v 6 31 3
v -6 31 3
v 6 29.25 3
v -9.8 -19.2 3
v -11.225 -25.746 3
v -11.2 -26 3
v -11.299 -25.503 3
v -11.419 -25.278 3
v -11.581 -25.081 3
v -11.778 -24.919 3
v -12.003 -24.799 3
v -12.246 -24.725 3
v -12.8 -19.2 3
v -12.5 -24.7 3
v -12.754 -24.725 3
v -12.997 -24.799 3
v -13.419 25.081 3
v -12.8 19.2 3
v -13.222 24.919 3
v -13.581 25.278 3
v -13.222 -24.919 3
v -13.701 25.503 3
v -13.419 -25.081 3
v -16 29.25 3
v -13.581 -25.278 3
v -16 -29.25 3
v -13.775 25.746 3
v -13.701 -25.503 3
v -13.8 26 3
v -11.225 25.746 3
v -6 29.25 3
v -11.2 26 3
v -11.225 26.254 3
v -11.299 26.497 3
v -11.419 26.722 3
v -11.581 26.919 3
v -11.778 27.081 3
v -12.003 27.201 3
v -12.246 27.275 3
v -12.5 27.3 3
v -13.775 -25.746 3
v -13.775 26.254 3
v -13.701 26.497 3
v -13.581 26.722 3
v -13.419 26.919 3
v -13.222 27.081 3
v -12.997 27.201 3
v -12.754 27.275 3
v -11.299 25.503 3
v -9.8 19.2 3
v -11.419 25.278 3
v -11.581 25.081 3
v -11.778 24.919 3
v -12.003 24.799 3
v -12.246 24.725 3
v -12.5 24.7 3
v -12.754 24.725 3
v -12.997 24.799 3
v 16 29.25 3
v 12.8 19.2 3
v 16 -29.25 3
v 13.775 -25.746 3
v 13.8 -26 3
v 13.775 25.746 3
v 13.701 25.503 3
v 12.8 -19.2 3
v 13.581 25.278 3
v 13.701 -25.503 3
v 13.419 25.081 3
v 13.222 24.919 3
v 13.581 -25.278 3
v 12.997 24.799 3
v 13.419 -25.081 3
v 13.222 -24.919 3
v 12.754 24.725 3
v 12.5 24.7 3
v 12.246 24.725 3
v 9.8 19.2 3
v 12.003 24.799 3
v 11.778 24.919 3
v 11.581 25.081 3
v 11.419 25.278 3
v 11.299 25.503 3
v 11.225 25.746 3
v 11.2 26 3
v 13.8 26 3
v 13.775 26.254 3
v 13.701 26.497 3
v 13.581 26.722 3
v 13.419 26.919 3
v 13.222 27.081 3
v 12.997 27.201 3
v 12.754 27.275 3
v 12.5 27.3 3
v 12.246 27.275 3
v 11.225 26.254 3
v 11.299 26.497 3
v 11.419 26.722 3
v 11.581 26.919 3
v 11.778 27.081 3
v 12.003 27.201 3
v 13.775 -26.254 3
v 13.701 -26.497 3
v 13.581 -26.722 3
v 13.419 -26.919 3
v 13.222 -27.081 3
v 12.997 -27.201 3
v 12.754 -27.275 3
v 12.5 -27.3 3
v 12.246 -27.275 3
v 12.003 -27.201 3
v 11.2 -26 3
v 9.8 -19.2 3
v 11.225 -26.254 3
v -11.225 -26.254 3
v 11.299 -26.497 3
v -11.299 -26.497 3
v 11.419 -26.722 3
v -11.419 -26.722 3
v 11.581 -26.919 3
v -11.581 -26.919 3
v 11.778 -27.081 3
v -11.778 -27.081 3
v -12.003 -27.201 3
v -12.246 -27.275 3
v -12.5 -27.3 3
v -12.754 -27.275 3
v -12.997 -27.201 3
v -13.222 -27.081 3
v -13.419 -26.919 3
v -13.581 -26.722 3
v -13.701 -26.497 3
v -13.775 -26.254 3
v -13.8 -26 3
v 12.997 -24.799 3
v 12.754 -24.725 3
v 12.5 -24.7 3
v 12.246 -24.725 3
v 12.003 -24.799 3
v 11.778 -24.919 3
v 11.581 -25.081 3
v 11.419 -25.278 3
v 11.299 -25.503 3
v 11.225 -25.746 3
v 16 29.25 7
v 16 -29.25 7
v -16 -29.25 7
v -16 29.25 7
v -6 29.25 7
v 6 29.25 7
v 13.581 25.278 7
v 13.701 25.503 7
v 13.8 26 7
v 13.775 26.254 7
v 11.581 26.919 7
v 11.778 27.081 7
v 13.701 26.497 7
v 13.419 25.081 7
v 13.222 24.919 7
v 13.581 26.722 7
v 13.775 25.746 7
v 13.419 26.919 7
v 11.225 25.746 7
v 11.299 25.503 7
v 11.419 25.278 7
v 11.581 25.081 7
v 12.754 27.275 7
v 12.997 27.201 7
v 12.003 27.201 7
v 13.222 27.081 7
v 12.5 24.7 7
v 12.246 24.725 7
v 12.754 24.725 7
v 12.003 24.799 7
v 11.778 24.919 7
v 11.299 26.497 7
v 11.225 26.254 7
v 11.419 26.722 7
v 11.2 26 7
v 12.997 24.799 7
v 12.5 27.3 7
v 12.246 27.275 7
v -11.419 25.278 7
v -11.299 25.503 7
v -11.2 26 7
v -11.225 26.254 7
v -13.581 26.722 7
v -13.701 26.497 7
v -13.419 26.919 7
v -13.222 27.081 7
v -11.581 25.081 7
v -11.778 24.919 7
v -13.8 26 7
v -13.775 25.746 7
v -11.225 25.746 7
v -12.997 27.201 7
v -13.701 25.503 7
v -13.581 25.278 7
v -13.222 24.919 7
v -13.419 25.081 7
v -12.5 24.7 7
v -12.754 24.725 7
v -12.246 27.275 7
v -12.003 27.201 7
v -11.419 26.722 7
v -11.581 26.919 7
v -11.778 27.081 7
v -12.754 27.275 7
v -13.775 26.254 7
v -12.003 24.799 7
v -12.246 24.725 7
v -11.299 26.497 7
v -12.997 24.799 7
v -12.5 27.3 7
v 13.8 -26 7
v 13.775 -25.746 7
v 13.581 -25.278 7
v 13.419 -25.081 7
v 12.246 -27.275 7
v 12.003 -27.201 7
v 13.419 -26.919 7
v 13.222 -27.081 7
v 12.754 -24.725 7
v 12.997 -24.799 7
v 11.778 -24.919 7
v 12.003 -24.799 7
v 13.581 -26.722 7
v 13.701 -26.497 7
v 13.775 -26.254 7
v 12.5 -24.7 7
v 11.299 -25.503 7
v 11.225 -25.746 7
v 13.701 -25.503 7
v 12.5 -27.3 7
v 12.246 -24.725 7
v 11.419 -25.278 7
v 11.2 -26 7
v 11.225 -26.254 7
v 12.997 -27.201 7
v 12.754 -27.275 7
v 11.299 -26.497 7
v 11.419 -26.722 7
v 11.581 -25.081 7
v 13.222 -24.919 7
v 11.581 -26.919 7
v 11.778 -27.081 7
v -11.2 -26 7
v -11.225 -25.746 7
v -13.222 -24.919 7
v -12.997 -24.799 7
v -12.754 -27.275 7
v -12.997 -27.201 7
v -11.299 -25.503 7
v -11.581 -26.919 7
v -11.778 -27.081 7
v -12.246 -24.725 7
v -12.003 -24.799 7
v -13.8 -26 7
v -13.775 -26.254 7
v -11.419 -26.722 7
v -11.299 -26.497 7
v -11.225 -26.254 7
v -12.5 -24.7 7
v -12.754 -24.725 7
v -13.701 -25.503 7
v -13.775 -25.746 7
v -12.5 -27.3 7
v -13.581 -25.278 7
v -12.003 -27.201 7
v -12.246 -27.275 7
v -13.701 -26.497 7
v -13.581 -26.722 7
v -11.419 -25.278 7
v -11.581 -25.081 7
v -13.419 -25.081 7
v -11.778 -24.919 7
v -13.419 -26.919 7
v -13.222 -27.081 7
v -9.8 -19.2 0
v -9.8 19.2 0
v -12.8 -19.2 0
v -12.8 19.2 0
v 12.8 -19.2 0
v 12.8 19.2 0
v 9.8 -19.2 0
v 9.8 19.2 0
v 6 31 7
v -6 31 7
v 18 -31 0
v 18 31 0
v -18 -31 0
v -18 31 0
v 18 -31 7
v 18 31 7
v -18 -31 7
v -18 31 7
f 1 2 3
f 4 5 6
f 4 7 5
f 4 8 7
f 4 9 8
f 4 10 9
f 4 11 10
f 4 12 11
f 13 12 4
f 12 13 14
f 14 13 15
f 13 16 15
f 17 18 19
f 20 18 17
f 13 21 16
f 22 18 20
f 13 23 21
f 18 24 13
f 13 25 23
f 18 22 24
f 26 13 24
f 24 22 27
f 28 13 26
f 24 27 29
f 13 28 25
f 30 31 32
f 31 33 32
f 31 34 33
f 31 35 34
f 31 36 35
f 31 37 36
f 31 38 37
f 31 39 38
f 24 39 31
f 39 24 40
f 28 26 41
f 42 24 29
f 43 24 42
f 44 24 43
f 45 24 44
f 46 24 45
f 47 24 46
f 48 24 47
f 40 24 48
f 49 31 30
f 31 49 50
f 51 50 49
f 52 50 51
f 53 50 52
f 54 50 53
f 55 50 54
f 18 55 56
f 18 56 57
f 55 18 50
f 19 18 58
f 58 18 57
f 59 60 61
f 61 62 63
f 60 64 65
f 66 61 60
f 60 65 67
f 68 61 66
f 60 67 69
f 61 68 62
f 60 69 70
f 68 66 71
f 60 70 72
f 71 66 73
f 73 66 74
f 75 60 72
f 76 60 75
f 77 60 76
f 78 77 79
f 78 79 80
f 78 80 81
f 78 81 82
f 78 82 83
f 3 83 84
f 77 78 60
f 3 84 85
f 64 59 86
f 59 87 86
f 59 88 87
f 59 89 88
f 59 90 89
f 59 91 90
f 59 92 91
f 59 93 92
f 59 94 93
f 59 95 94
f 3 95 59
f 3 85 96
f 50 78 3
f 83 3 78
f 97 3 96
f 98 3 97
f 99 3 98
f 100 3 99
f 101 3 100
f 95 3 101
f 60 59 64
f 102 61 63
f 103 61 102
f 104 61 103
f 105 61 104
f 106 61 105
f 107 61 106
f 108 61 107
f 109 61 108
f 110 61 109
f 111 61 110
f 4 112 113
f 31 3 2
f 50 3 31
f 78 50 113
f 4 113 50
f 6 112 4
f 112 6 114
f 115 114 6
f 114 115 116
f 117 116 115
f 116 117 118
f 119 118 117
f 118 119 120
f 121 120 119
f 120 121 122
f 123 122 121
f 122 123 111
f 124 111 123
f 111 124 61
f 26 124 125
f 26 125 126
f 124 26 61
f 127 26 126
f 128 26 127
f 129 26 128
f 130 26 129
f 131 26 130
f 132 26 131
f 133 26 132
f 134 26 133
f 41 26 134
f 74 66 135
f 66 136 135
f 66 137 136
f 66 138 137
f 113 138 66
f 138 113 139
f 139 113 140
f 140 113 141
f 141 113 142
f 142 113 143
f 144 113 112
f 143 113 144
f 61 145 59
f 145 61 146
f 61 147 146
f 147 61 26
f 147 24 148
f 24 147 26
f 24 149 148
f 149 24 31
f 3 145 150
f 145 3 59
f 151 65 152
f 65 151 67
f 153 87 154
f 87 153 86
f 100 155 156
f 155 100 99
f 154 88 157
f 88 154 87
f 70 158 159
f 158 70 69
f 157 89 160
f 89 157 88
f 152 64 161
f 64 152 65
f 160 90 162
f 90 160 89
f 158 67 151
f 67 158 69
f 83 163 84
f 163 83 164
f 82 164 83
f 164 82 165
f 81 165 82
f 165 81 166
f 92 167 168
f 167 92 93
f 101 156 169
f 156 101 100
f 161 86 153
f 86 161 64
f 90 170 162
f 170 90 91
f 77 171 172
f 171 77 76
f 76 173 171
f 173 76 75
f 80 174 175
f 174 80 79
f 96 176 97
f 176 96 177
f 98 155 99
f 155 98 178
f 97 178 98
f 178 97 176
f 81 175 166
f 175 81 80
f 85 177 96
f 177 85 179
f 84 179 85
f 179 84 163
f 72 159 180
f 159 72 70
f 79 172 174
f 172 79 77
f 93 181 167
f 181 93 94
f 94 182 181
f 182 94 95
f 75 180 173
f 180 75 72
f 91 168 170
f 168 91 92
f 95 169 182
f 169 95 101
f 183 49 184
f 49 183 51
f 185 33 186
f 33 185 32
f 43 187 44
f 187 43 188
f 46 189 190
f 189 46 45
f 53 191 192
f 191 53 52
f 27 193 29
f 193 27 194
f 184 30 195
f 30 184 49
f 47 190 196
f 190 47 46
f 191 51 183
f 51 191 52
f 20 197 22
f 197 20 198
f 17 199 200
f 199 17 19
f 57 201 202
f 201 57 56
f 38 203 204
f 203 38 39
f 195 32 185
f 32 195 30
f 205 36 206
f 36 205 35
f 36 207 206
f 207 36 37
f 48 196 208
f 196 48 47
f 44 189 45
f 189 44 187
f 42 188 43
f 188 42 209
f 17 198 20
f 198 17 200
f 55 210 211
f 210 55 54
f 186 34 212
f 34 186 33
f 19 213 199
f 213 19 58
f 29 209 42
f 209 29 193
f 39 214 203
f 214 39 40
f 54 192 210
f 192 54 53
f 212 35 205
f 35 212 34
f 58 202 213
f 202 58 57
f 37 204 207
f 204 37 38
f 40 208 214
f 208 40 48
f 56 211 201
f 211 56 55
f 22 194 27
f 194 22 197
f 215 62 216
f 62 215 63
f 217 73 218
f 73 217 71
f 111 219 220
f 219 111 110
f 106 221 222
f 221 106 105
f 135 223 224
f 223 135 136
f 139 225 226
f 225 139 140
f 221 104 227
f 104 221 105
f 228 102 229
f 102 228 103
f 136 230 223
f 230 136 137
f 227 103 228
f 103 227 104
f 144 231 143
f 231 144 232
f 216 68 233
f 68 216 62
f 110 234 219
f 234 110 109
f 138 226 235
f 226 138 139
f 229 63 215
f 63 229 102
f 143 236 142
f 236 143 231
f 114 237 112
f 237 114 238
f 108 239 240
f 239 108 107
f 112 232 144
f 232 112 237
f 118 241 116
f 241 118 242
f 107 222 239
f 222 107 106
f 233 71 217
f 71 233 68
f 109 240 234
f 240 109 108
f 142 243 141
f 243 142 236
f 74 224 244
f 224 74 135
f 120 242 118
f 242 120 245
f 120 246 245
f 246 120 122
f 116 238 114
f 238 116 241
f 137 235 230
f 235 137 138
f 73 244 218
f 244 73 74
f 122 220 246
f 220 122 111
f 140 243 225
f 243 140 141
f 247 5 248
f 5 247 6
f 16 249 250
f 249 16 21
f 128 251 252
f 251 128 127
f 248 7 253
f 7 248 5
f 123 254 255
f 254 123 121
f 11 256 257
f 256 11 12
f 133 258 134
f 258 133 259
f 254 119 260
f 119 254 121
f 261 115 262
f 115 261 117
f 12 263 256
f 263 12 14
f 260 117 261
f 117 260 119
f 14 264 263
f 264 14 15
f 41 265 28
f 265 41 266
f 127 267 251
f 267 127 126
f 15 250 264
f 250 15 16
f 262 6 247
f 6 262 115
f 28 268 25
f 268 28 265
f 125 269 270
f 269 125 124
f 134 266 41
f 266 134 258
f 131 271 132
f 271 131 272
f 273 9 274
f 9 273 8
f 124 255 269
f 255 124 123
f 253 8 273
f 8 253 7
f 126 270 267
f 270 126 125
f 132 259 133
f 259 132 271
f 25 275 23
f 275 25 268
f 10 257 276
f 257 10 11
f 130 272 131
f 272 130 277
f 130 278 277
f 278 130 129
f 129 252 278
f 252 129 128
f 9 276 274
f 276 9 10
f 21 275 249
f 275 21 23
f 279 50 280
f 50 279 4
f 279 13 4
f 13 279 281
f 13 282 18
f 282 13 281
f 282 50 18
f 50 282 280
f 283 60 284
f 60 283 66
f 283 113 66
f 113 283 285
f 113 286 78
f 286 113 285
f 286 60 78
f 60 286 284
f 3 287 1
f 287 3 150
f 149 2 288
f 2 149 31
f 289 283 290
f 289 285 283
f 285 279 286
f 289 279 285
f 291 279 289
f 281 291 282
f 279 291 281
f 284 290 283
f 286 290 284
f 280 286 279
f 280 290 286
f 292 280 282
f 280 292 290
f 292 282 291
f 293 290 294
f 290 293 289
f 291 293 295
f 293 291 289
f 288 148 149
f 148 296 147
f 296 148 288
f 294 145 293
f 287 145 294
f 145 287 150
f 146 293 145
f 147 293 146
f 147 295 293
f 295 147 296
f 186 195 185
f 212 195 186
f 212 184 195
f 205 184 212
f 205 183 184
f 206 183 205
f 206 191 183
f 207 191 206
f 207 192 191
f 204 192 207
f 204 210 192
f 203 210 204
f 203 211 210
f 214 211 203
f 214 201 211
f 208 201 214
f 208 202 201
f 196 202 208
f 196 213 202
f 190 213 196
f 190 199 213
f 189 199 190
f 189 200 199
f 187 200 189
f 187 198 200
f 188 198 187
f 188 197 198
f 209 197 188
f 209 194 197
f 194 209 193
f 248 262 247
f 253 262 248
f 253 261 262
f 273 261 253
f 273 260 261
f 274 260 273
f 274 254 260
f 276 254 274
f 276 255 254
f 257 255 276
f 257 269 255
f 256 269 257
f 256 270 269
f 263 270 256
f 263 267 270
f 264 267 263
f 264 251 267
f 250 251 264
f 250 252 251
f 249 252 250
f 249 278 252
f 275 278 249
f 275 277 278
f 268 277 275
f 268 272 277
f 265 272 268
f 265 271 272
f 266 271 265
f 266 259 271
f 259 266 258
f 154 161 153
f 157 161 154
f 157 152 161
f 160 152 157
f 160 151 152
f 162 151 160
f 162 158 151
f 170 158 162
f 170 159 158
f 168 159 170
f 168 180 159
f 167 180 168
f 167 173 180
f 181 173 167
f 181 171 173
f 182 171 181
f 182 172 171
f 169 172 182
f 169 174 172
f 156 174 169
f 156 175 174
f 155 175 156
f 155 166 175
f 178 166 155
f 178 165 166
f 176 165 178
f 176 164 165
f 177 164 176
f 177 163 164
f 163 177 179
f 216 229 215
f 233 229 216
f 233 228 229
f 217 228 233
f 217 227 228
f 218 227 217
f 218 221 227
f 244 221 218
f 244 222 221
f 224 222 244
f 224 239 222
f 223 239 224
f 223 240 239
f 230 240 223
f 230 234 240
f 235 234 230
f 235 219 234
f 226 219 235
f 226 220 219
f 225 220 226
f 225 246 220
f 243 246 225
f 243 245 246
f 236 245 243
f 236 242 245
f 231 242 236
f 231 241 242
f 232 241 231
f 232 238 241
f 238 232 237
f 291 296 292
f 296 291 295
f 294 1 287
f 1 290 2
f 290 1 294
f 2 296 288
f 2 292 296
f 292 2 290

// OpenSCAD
difference()
{
    linear_extrude(height = 7.0, twist = 0.0, scale = 1.0, slices = 1, center = false)
    {
        scale([36.0, 62.0])
        {
            M8();
        }
    }
    translate([0.0, 0.0, 3.0])
    {
        union()
        {
            union()
            {
                difference()
                {
                    linear_extrude(height = 6.0, twist = 0.0, scale = 1.0, slices = 1, center = false)
                    {
                        scale([32.0, 58.5])
                        {
                            M8();
                        }
                    }
                    translate([12.5, 26.0, 0.0])
                    {
                        translate([0.0, 0.0, -1.0])
                        {
                            linear_extrude(height = 8.0, twist = 0.0, scale = 1.0, slices = 1, center = false)
                            {
                                scale([2.6, 2.6])
                                {
                                    M52();
                                }
                            }
                        }
                    }
                    translate([-12.5, 26.0, 0.0])
                    {
                        translate([0.0, 0.0, -1.0])
                        {
                            linear_extrude(height = 8.0, twist = 0.0, scale = 1.0, slices = 1, center = false)
                            {
                                scale([2.6, 2.6])
                                {
                                    M52();
                                }
                            }
                        }
                    }
                    translate([12.5, -26.0, 0.0])
                    {
                        translate([0.0, 0.0, -1.0])
                        {
                            linear_extrude(height = 8.0, twist = 0.0, scale = 1.0, slices = 1, center = false)
                            {
                                scale([2.6, 2.6])
                                {
                                    M52();
                                }
                            }
                        }
                    }
                    translate([-12.5, -26.0, 0.0])
                    {
                        translate([0.0, 0.0, -1.0])
                        {
                            linear_extrude(height = 8.0, twist = 0.0, scale = 1.0, slices = 1, center = false)
                            {
                                scale([2.6, 2.6])
                                {
                                    M52();
                                }
                            }
                        }
                    }
                }
                translate([-11.3, 0.0, 0.0])
                {
                    translate([0.0, 0.0, -10.0])
                    {
                        linear_extrude(height = 11.0, twist = 0.0, scale = 1.0, slices = 1, center = false)
                        {
                            scale([3.0, 38.4])
                            {
                                M8();
                            }
                        }
                    }
                }
                translate([11.3, 0.0, 0.0])
                {
                    translate([0.0, 0.0, -10.0])
                    {
                        linear_extrude(height = 11.0, twist = 0.0, scale = 1.0, slices = 1, center = false)
                        {
                            scale([3.0, 38.4])
                            {
                                M8();
                            }
                        }
                    }
                }
            }
            translate([0.0, 38.75, 0.0])
            {
                translate([0.0, 0.0, 0.0])
                {
                    linear_extrude(height = 6.0, twist = 0.0, scale = 1.0, slices = 1, center = false)
                    {
                        scale([12.0, 21.0])
                        {
                            M8();
                        }
                    }
                }
            }
        }
    }
}

module M52()
{
    polygon
    (
        points =
        [
            [0.5, 0.0], 
            [0.4903926402016152, 0.09754516100806412], 
            [0.46193976625564337, 0.1913417161825449], 
            [0.4157348061512726, 0.2777851165098011], 
            [0.3535533905932738, 0.35355339059327373], 
            [0.27778511650980114, 0.4157348061512726], 
            [0.19134171618254492, 0.46193976625564337], 
            [0.09754516100806417, 0.4903926402016152], 
            [3.061616997868383E-17, 0.5], 
            [-0.0975451610080641, 0.4903926402016152], 
            [-0.19134171618254486, 0.46193976625564337], 
            [-0.277785116509801, 0.41573480615127273], 
            [-0.35355339059327373, 0.3535533905932738], 
            [-0.4157348061512727, 0.2777851165098011], 
            [-0.46193976625564337, 0.19134171618254495], 
            [-0.4903926402016152, 0.0975451610080643], 
            [-0.5, 6.123233995736766E-17], 
            [-0.4903926402016152, -0.09754516100806418], 
            [-0.4619397662556434, -0.19134171618254484], 
            [-0.41573480615127273, -0.277785116509801], 
            [-0.35355339059327384, -0.35355339059327373], 
            [-0.2777851165098011, -0.4157348061512726], 
            [-0.19134171618254517, -0.46193976625564326], 
            [-0.09754516100806433, -0.49039264020161516], 
            [-9.184850993605148E-17, -0.5], 
            [0.09754516100806415, -0.4903926402016152], 
            [0.191341716182545, -0.4619397662556433], 
            [0.2777851165098009, -0.41573480615127273], 
            [0.3535533905932737, -0.35355339059327384], 
            [0.4157348061512726, -0.2777851165098011], 
            [0.46193976625564326, -0.1913417161825452], 
            [0.49039264020161516, -0.09754516100806436]
        ],
        paths =
        [
            [0, 1, 2, 3, 4, 5, 6, 7, 8, 9, 10, 11, 12, 13, 14, 15, 16, 17, 18, 19, 20, 21, 22, 23, 24, 25, 26, 27, 28, 29, 30, 31]
        ]
    );
}

module M8()
{
    polygon
    (
        points =
        [
            [-0.5, -0.5], 
            [0.5, -0.5], 
            [0.5, 0.5], 
            [-0.5, 0.5]
        ],
        paths =
        [
            [0, 1, 2, 3]
        ]
    );
}
